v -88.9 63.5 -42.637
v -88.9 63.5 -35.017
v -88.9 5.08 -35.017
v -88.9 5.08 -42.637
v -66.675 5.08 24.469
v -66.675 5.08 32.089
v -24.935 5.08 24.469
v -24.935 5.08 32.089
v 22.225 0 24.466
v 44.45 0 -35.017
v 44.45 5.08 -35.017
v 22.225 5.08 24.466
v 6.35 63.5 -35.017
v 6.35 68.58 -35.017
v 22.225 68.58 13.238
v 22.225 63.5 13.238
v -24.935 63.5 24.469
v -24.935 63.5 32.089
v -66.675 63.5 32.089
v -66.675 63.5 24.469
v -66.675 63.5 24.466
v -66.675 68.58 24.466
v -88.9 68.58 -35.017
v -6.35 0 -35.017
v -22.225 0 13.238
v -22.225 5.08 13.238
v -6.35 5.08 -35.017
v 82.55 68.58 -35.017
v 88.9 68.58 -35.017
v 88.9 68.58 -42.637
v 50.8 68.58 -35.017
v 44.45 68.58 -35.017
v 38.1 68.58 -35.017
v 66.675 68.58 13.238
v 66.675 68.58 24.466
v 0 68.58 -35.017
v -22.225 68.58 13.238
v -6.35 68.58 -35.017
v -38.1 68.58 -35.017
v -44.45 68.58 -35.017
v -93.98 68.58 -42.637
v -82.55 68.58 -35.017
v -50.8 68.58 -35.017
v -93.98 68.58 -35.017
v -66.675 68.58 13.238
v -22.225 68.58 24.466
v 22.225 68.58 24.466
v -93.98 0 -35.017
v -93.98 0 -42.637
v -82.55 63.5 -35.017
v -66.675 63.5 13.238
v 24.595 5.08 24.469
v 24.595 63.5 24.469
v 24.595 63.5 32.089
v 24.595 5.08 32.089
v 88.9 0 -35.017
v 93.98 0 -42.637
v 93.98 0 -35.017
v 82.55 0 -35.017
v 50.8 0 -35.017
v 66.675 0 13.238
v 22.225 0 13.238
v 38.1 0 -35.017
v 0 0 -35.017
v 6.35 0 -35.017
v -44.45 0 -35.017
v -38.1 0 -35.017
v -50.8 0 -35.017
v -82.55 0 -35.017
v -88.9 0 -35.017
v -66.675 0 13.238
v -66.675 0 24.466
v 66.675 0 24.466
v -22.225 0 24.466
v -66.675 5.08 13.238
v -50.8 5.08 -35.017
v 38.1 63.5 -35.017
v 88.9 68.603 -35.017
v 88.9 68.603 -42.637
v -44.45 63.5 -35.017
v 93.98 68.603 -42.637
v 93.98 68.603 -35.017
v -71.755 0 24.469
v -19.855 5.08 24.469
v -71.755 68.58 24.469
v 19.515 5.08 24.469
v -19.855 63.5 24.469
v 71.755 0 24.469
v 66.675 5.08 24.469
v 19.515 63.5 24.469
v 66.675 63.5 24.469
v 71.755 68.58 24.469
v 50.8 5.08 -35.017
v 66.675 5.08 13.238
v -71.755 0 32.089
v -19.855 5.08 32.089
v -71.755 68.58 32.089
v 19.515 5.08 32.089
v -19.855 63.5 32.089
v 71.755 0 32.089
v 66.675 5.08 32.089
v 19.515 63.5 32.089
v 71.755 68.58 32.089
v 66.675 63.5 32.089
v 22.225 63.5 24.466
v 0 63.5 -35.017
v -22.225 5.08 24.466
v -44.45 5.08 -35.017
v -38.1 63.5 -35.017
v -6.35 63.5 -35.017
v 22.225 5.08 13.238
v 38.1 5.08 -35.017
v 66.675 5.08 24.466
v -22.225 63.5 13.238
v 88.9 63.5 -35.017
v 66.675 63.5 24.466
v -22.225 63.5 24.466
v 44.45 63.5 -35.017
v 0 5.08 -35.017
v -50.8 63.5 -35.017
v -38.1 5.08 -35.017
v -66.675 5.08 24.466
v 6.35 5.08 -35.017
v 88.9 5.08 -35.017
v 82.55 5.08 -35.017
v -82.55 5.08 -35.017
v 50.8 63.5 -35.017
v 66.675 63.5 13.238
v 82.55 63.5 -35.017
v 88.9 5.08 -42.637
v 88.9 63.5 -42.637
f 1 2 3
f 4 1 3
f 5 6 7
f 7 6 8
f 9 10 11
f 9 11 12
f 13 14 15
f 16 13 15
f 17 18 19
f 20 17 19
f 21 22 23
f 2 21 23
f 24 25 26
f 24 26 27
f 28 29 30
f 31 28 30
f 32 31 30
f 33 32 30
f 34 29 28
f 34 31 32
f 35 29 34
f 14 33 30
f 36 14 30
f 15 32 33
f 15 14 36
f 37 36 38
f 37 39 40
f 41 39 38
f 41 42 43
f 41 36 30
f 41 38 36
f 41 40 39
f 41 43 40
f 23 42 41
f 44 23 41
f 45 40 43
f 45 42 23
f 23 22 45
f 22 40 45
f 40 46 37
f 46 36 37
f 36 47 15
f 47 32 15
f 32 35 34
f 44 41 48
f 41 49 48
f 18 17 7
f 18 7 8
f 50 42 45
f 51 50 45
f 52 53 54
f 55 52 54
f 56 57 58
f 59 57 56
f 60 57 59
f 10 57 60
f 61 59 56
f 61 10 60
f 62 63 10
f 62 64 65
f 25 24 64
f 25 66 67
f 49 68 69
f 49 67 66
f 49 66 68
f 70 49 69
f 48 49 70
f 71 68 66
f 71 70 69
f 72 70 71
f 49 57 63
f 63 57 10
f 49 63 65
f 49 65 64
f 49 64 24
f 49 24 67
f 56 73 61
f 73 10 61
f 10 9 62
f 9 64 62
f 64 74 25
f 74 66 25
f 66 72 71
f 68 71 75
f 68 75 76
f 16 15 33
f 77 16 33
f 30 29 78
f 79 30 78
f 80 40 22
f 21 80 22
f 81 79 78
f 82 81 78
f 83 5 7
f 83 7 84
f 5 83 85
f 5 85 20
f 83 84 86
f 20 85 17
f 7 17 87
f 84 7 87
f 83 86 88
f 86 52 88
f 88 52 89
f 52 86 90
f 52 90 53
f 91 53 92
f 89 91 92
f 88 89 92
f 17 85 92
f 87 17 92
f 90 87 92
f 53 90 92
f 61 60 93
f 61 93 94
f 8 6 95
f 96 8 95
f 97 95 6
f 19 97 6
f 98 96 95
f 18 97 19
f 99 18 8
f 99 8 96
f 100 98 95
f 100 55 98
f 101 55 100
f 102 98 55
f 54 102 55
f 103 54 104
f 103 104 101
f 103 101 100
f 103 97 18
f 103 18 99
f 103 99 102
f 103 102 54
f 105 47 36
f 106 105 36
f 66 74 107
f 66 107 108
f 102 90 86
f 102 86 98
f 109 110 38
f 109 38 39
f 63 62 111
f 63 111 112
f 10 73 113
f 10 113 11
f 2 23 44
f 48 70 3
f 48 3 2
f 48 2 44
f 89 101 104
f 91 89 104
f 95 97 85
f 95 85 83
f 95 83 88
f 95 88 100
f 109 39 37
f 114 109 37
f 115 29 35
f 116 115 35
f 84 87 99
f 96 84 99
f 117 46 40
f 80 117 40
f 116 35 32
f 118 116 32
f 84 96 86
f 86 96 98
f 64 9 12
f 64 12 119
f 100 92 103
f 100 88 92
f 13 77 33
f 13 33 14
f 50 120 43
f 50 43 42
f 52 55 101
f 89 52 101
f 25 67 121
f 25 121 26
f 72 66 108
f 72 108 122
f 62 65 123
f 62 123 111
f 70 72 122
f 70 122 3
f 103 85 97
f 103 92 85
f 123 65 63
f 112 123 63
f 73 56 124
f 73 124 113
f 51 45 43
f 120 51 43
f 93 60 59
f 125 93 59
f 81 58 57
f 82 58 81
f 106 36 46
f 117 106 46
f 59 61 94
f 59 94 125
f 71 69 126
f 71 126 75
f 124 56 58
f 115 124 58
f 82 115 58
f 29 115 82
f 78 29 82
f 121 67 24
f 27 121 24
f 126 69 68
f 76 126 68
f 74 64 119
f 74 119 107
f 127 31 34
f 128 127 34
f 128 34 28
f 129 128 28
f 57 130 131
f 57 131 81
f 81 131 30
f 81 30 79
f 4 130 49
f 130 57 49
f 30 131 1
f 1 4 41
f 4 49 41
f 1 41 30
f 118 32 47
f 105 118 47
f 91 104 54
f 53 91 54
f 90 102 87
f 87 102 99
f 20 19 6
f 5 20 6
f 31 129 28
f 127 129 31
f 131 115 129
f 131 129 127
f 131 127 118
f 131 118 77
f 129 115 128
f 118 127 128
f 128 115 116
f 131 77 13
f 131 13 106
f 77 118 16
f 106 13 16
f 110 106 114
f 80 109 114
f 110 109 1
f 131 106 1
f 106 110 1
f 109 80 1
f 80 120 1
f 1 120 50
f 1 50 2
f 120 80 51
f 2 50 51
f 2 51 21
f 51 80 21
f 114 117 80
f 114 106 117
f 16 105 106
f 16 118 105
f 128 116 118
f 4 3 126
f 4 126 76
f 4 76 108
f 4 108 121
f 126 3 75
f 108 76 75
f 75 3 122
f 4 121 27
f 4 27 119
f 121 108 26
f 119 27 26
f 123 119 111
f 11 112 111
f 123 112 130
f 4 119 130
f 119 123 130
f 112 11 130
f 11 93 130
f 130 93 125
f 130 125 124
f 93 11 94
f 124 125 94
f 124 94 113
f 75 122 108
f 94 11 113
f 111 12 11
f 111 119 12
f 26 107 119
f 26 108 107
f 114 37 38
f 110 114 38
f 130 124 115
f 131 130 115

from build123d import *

# Parameters (mm, degrees)
F0_W      = 177.8
F0_H      = 7.62
F1_DEPTH  = 5.08
F0_W_2    = 133.35
F3_DEPTH  = 5.08
F4_W      = 58.42
F4_H      = 7.62
F4_W_2    = 5.08
F5_DEPTH  = 5.08
F6_W      = 182.88
F6_H      = 7.62
F7_DEPTH  = 5.08
F8_W      = 68.6033219099
F8_H      = 7.62
F9_DEPTH  = 5.08
F11_DEPTH = 5.08
F12_W     = 63.5
F12_H     = 7.62
F13_DEPTH = 5.08
F14_W     = 138.43
F14_H     = 7.62
F15_DEPTH = 5.08
F16_W     = 68.58
F16_H     = 7.62
F17_DEPTH = 5.08
F18_W     = 5.08
F18_H     = 7.62
F19_DEPTH = 63.5
F20_W     = 5.08
F20_H     = 7.62
F21_DEPTH = 63.5


# Not quite as in the source:
# - a pattern or mirror of a feature is missing from the dataset's text; its kind, count and spacing are read off the source's solid


with BuildPart() as f1:
    # F0 (on Front) → F1 (new body)
    with BuildSketch(Plane.XZ):
        with Locations((0, -38.8273451847)):
            Rectangle(F0_W, F0_H)
    extrude(amount=-F1_DEPTH)

    # F2 (on Front) → F3 (join)
    with BuildSketch(Plane.XZ):
        Polygon((-66.675, 24.46626075), (-88.9, -35.0173451847), (-82.55, -35.0173451847), (-66.675, 13.2384770029), (-50.8, -35.0173451847), (-44.45, -35.0173451847), align=None)
        Polygon((-22.225, 24.46626075), (-44.45, -35.0173451847), (-38.1, -35.0173451847), (-22.225, 13.2384770029), (-6.35, -35.0173451847), (0, -35.0173451847), align=None)
        Polygon((22.225, 24.46626075), (0, -35.0173451847), (6.35, -35.0173451847), (22.225, 13.2384770029), (38.1, -35.0173451847), (44.45, -35.0173451847), align=None)
        Polygon((66.675, 24.46626075), (44.45, -35.0173451847), (50.8, -35.0173451847), (66.675, 13.2384770029), (82.55, -35.0173451847), (88.9, -35.0173451847), align=None)
    f3 = extrude(amount=-F3_DEPTH)

    # F3_copies: F3 across plane
    add(f3.mirror(Plane.ZX.offset(34.29)))

    # F4 (on face) → F5 (join)
    with BuildSketch(Plane(origin=(-88.9, 0, 0), x_dir=(0, -1, 0), z_dir=(-1, 0, 0))):
        with Locations((-34.29, -38.8273451847)):
            Rectangle(F4_W, F4_H)
        with Locations((-2.54, -38.8273451847)):
            Rectangle(F4_W_2, F4_H)
    extrude(amount=F5_DEPTH)

    # F6 (on face) → F7 (join)
    with BuildSketch(Plane(origin=(0, 63.5, 0), x_dir=(-1, 0, 0), z_dir=(0, 1, 0))):
        with Locations((2.54, -38.8273451847)):
            Rectangle(F6_W, F6_H)
    extrude(amount=F7_DEPTH)

    # F8 (on face) → F9 (join)
    with BuildSketch(Plane.YZ.offset(88.9)):
        with Locations((34.301660955, -38.8273451847)):
            Rectangle(F8_W, F8_H)
    extrude(amount=F9_DEPTH)

    # F10 (on face) → F11 (join)
    with BuildSketch(Plane.XZ):
        Polygon((-66.675, 24.46626075), (-88.9, -35.0173451847), (-82.55, -35.0173451847), (-66.675, 13.2384770029), (-50.8, -35.0173451847), (-44.45, -35.0173451847), align=None)
        Polygon((-22.225, 24.46626075), (-44.45, -35.0173451847), (-38.1, -35.0173451847), (-22.225, 13.2384770029), (-6.35, -35.0173451847), (0, -35.0173451847), align=None)
        Polygon((22.225, 24.46626075), (0, -35.0173451847), (6.35, -35.0173451847), (22.225, 13.2384770029), (38.1, -35.0173451847), (44.45, -35.0173451847), align=None)
        Polygon((82.55, -35.0173451847), (88.9, -35.0173451847), (66.675, 24.46626075), (44.45, -35.0173451847), (50.8, -35.0173451847), (66.675, 13.2384770029), align=None)
    extrude(amount=-F11_DEPTH)


with BuildPart() as f1b:
    # F0 (on Front) → F1, piece 2 (new body)
    with BuildSketch(Plane.XZ):
        with Locations((0, 28.2794548153)):
            Rectangle(F0_W_2, F0_H)
    extrude(amount=-F1_DEPTH)

    # F12 (on face) → F13 (join)
    with BuildSketch(Plane.YZ.offset(66.675)):
        with Locations((31.75, 28.2794548153)):
            Rectangle(F12_W, F12_H)
    extrude(amount=F13_DEPTH)

    # F14 (on face) → F15 (join)
    with BuildSketch(Plane(origin=(0, 63.5, 0), x_dir=(-1, 0, 0), z_dir=(0, 1, 0))):
        with Locations((-2.54, 28.2794548153)):
            Rectangle(F14_W, F14_H)
    extrude(amount=F15_DEPTH)

    # F16 (on face) → F17 (join)
    with BuildSketch(Plane(origin=(-66.675, 0, 0), x_dir=(0, -1, 0), z_dir=(-1, 0, 0))):
        with Locations((-34.29, 28.2794548153)):
            Rectangle(F16_W, F16_H)
    extrude(amount=F17_DEPTH)

    # F18 (on face) → F19 (join)
    with BuildSketch(Plane.XZ.offset(-63.5)):
        with Locations((-22.3953099983, 28.2794548153)):
            Rectangle(F18_W, F18_H)
    extrude(amount=F19_DEPTH)

    # F20 (on face) → F21 (join)
    with BuildSketch(Plane.XZ.offset(-63.5)):
        with Locations((22.0546900017, 28.2794548153)):
            Rectangle(F20_W, F20_H)
    extrude(amount=F21_DEPTH)


solid = Compound([f1.part, f1b.part])
